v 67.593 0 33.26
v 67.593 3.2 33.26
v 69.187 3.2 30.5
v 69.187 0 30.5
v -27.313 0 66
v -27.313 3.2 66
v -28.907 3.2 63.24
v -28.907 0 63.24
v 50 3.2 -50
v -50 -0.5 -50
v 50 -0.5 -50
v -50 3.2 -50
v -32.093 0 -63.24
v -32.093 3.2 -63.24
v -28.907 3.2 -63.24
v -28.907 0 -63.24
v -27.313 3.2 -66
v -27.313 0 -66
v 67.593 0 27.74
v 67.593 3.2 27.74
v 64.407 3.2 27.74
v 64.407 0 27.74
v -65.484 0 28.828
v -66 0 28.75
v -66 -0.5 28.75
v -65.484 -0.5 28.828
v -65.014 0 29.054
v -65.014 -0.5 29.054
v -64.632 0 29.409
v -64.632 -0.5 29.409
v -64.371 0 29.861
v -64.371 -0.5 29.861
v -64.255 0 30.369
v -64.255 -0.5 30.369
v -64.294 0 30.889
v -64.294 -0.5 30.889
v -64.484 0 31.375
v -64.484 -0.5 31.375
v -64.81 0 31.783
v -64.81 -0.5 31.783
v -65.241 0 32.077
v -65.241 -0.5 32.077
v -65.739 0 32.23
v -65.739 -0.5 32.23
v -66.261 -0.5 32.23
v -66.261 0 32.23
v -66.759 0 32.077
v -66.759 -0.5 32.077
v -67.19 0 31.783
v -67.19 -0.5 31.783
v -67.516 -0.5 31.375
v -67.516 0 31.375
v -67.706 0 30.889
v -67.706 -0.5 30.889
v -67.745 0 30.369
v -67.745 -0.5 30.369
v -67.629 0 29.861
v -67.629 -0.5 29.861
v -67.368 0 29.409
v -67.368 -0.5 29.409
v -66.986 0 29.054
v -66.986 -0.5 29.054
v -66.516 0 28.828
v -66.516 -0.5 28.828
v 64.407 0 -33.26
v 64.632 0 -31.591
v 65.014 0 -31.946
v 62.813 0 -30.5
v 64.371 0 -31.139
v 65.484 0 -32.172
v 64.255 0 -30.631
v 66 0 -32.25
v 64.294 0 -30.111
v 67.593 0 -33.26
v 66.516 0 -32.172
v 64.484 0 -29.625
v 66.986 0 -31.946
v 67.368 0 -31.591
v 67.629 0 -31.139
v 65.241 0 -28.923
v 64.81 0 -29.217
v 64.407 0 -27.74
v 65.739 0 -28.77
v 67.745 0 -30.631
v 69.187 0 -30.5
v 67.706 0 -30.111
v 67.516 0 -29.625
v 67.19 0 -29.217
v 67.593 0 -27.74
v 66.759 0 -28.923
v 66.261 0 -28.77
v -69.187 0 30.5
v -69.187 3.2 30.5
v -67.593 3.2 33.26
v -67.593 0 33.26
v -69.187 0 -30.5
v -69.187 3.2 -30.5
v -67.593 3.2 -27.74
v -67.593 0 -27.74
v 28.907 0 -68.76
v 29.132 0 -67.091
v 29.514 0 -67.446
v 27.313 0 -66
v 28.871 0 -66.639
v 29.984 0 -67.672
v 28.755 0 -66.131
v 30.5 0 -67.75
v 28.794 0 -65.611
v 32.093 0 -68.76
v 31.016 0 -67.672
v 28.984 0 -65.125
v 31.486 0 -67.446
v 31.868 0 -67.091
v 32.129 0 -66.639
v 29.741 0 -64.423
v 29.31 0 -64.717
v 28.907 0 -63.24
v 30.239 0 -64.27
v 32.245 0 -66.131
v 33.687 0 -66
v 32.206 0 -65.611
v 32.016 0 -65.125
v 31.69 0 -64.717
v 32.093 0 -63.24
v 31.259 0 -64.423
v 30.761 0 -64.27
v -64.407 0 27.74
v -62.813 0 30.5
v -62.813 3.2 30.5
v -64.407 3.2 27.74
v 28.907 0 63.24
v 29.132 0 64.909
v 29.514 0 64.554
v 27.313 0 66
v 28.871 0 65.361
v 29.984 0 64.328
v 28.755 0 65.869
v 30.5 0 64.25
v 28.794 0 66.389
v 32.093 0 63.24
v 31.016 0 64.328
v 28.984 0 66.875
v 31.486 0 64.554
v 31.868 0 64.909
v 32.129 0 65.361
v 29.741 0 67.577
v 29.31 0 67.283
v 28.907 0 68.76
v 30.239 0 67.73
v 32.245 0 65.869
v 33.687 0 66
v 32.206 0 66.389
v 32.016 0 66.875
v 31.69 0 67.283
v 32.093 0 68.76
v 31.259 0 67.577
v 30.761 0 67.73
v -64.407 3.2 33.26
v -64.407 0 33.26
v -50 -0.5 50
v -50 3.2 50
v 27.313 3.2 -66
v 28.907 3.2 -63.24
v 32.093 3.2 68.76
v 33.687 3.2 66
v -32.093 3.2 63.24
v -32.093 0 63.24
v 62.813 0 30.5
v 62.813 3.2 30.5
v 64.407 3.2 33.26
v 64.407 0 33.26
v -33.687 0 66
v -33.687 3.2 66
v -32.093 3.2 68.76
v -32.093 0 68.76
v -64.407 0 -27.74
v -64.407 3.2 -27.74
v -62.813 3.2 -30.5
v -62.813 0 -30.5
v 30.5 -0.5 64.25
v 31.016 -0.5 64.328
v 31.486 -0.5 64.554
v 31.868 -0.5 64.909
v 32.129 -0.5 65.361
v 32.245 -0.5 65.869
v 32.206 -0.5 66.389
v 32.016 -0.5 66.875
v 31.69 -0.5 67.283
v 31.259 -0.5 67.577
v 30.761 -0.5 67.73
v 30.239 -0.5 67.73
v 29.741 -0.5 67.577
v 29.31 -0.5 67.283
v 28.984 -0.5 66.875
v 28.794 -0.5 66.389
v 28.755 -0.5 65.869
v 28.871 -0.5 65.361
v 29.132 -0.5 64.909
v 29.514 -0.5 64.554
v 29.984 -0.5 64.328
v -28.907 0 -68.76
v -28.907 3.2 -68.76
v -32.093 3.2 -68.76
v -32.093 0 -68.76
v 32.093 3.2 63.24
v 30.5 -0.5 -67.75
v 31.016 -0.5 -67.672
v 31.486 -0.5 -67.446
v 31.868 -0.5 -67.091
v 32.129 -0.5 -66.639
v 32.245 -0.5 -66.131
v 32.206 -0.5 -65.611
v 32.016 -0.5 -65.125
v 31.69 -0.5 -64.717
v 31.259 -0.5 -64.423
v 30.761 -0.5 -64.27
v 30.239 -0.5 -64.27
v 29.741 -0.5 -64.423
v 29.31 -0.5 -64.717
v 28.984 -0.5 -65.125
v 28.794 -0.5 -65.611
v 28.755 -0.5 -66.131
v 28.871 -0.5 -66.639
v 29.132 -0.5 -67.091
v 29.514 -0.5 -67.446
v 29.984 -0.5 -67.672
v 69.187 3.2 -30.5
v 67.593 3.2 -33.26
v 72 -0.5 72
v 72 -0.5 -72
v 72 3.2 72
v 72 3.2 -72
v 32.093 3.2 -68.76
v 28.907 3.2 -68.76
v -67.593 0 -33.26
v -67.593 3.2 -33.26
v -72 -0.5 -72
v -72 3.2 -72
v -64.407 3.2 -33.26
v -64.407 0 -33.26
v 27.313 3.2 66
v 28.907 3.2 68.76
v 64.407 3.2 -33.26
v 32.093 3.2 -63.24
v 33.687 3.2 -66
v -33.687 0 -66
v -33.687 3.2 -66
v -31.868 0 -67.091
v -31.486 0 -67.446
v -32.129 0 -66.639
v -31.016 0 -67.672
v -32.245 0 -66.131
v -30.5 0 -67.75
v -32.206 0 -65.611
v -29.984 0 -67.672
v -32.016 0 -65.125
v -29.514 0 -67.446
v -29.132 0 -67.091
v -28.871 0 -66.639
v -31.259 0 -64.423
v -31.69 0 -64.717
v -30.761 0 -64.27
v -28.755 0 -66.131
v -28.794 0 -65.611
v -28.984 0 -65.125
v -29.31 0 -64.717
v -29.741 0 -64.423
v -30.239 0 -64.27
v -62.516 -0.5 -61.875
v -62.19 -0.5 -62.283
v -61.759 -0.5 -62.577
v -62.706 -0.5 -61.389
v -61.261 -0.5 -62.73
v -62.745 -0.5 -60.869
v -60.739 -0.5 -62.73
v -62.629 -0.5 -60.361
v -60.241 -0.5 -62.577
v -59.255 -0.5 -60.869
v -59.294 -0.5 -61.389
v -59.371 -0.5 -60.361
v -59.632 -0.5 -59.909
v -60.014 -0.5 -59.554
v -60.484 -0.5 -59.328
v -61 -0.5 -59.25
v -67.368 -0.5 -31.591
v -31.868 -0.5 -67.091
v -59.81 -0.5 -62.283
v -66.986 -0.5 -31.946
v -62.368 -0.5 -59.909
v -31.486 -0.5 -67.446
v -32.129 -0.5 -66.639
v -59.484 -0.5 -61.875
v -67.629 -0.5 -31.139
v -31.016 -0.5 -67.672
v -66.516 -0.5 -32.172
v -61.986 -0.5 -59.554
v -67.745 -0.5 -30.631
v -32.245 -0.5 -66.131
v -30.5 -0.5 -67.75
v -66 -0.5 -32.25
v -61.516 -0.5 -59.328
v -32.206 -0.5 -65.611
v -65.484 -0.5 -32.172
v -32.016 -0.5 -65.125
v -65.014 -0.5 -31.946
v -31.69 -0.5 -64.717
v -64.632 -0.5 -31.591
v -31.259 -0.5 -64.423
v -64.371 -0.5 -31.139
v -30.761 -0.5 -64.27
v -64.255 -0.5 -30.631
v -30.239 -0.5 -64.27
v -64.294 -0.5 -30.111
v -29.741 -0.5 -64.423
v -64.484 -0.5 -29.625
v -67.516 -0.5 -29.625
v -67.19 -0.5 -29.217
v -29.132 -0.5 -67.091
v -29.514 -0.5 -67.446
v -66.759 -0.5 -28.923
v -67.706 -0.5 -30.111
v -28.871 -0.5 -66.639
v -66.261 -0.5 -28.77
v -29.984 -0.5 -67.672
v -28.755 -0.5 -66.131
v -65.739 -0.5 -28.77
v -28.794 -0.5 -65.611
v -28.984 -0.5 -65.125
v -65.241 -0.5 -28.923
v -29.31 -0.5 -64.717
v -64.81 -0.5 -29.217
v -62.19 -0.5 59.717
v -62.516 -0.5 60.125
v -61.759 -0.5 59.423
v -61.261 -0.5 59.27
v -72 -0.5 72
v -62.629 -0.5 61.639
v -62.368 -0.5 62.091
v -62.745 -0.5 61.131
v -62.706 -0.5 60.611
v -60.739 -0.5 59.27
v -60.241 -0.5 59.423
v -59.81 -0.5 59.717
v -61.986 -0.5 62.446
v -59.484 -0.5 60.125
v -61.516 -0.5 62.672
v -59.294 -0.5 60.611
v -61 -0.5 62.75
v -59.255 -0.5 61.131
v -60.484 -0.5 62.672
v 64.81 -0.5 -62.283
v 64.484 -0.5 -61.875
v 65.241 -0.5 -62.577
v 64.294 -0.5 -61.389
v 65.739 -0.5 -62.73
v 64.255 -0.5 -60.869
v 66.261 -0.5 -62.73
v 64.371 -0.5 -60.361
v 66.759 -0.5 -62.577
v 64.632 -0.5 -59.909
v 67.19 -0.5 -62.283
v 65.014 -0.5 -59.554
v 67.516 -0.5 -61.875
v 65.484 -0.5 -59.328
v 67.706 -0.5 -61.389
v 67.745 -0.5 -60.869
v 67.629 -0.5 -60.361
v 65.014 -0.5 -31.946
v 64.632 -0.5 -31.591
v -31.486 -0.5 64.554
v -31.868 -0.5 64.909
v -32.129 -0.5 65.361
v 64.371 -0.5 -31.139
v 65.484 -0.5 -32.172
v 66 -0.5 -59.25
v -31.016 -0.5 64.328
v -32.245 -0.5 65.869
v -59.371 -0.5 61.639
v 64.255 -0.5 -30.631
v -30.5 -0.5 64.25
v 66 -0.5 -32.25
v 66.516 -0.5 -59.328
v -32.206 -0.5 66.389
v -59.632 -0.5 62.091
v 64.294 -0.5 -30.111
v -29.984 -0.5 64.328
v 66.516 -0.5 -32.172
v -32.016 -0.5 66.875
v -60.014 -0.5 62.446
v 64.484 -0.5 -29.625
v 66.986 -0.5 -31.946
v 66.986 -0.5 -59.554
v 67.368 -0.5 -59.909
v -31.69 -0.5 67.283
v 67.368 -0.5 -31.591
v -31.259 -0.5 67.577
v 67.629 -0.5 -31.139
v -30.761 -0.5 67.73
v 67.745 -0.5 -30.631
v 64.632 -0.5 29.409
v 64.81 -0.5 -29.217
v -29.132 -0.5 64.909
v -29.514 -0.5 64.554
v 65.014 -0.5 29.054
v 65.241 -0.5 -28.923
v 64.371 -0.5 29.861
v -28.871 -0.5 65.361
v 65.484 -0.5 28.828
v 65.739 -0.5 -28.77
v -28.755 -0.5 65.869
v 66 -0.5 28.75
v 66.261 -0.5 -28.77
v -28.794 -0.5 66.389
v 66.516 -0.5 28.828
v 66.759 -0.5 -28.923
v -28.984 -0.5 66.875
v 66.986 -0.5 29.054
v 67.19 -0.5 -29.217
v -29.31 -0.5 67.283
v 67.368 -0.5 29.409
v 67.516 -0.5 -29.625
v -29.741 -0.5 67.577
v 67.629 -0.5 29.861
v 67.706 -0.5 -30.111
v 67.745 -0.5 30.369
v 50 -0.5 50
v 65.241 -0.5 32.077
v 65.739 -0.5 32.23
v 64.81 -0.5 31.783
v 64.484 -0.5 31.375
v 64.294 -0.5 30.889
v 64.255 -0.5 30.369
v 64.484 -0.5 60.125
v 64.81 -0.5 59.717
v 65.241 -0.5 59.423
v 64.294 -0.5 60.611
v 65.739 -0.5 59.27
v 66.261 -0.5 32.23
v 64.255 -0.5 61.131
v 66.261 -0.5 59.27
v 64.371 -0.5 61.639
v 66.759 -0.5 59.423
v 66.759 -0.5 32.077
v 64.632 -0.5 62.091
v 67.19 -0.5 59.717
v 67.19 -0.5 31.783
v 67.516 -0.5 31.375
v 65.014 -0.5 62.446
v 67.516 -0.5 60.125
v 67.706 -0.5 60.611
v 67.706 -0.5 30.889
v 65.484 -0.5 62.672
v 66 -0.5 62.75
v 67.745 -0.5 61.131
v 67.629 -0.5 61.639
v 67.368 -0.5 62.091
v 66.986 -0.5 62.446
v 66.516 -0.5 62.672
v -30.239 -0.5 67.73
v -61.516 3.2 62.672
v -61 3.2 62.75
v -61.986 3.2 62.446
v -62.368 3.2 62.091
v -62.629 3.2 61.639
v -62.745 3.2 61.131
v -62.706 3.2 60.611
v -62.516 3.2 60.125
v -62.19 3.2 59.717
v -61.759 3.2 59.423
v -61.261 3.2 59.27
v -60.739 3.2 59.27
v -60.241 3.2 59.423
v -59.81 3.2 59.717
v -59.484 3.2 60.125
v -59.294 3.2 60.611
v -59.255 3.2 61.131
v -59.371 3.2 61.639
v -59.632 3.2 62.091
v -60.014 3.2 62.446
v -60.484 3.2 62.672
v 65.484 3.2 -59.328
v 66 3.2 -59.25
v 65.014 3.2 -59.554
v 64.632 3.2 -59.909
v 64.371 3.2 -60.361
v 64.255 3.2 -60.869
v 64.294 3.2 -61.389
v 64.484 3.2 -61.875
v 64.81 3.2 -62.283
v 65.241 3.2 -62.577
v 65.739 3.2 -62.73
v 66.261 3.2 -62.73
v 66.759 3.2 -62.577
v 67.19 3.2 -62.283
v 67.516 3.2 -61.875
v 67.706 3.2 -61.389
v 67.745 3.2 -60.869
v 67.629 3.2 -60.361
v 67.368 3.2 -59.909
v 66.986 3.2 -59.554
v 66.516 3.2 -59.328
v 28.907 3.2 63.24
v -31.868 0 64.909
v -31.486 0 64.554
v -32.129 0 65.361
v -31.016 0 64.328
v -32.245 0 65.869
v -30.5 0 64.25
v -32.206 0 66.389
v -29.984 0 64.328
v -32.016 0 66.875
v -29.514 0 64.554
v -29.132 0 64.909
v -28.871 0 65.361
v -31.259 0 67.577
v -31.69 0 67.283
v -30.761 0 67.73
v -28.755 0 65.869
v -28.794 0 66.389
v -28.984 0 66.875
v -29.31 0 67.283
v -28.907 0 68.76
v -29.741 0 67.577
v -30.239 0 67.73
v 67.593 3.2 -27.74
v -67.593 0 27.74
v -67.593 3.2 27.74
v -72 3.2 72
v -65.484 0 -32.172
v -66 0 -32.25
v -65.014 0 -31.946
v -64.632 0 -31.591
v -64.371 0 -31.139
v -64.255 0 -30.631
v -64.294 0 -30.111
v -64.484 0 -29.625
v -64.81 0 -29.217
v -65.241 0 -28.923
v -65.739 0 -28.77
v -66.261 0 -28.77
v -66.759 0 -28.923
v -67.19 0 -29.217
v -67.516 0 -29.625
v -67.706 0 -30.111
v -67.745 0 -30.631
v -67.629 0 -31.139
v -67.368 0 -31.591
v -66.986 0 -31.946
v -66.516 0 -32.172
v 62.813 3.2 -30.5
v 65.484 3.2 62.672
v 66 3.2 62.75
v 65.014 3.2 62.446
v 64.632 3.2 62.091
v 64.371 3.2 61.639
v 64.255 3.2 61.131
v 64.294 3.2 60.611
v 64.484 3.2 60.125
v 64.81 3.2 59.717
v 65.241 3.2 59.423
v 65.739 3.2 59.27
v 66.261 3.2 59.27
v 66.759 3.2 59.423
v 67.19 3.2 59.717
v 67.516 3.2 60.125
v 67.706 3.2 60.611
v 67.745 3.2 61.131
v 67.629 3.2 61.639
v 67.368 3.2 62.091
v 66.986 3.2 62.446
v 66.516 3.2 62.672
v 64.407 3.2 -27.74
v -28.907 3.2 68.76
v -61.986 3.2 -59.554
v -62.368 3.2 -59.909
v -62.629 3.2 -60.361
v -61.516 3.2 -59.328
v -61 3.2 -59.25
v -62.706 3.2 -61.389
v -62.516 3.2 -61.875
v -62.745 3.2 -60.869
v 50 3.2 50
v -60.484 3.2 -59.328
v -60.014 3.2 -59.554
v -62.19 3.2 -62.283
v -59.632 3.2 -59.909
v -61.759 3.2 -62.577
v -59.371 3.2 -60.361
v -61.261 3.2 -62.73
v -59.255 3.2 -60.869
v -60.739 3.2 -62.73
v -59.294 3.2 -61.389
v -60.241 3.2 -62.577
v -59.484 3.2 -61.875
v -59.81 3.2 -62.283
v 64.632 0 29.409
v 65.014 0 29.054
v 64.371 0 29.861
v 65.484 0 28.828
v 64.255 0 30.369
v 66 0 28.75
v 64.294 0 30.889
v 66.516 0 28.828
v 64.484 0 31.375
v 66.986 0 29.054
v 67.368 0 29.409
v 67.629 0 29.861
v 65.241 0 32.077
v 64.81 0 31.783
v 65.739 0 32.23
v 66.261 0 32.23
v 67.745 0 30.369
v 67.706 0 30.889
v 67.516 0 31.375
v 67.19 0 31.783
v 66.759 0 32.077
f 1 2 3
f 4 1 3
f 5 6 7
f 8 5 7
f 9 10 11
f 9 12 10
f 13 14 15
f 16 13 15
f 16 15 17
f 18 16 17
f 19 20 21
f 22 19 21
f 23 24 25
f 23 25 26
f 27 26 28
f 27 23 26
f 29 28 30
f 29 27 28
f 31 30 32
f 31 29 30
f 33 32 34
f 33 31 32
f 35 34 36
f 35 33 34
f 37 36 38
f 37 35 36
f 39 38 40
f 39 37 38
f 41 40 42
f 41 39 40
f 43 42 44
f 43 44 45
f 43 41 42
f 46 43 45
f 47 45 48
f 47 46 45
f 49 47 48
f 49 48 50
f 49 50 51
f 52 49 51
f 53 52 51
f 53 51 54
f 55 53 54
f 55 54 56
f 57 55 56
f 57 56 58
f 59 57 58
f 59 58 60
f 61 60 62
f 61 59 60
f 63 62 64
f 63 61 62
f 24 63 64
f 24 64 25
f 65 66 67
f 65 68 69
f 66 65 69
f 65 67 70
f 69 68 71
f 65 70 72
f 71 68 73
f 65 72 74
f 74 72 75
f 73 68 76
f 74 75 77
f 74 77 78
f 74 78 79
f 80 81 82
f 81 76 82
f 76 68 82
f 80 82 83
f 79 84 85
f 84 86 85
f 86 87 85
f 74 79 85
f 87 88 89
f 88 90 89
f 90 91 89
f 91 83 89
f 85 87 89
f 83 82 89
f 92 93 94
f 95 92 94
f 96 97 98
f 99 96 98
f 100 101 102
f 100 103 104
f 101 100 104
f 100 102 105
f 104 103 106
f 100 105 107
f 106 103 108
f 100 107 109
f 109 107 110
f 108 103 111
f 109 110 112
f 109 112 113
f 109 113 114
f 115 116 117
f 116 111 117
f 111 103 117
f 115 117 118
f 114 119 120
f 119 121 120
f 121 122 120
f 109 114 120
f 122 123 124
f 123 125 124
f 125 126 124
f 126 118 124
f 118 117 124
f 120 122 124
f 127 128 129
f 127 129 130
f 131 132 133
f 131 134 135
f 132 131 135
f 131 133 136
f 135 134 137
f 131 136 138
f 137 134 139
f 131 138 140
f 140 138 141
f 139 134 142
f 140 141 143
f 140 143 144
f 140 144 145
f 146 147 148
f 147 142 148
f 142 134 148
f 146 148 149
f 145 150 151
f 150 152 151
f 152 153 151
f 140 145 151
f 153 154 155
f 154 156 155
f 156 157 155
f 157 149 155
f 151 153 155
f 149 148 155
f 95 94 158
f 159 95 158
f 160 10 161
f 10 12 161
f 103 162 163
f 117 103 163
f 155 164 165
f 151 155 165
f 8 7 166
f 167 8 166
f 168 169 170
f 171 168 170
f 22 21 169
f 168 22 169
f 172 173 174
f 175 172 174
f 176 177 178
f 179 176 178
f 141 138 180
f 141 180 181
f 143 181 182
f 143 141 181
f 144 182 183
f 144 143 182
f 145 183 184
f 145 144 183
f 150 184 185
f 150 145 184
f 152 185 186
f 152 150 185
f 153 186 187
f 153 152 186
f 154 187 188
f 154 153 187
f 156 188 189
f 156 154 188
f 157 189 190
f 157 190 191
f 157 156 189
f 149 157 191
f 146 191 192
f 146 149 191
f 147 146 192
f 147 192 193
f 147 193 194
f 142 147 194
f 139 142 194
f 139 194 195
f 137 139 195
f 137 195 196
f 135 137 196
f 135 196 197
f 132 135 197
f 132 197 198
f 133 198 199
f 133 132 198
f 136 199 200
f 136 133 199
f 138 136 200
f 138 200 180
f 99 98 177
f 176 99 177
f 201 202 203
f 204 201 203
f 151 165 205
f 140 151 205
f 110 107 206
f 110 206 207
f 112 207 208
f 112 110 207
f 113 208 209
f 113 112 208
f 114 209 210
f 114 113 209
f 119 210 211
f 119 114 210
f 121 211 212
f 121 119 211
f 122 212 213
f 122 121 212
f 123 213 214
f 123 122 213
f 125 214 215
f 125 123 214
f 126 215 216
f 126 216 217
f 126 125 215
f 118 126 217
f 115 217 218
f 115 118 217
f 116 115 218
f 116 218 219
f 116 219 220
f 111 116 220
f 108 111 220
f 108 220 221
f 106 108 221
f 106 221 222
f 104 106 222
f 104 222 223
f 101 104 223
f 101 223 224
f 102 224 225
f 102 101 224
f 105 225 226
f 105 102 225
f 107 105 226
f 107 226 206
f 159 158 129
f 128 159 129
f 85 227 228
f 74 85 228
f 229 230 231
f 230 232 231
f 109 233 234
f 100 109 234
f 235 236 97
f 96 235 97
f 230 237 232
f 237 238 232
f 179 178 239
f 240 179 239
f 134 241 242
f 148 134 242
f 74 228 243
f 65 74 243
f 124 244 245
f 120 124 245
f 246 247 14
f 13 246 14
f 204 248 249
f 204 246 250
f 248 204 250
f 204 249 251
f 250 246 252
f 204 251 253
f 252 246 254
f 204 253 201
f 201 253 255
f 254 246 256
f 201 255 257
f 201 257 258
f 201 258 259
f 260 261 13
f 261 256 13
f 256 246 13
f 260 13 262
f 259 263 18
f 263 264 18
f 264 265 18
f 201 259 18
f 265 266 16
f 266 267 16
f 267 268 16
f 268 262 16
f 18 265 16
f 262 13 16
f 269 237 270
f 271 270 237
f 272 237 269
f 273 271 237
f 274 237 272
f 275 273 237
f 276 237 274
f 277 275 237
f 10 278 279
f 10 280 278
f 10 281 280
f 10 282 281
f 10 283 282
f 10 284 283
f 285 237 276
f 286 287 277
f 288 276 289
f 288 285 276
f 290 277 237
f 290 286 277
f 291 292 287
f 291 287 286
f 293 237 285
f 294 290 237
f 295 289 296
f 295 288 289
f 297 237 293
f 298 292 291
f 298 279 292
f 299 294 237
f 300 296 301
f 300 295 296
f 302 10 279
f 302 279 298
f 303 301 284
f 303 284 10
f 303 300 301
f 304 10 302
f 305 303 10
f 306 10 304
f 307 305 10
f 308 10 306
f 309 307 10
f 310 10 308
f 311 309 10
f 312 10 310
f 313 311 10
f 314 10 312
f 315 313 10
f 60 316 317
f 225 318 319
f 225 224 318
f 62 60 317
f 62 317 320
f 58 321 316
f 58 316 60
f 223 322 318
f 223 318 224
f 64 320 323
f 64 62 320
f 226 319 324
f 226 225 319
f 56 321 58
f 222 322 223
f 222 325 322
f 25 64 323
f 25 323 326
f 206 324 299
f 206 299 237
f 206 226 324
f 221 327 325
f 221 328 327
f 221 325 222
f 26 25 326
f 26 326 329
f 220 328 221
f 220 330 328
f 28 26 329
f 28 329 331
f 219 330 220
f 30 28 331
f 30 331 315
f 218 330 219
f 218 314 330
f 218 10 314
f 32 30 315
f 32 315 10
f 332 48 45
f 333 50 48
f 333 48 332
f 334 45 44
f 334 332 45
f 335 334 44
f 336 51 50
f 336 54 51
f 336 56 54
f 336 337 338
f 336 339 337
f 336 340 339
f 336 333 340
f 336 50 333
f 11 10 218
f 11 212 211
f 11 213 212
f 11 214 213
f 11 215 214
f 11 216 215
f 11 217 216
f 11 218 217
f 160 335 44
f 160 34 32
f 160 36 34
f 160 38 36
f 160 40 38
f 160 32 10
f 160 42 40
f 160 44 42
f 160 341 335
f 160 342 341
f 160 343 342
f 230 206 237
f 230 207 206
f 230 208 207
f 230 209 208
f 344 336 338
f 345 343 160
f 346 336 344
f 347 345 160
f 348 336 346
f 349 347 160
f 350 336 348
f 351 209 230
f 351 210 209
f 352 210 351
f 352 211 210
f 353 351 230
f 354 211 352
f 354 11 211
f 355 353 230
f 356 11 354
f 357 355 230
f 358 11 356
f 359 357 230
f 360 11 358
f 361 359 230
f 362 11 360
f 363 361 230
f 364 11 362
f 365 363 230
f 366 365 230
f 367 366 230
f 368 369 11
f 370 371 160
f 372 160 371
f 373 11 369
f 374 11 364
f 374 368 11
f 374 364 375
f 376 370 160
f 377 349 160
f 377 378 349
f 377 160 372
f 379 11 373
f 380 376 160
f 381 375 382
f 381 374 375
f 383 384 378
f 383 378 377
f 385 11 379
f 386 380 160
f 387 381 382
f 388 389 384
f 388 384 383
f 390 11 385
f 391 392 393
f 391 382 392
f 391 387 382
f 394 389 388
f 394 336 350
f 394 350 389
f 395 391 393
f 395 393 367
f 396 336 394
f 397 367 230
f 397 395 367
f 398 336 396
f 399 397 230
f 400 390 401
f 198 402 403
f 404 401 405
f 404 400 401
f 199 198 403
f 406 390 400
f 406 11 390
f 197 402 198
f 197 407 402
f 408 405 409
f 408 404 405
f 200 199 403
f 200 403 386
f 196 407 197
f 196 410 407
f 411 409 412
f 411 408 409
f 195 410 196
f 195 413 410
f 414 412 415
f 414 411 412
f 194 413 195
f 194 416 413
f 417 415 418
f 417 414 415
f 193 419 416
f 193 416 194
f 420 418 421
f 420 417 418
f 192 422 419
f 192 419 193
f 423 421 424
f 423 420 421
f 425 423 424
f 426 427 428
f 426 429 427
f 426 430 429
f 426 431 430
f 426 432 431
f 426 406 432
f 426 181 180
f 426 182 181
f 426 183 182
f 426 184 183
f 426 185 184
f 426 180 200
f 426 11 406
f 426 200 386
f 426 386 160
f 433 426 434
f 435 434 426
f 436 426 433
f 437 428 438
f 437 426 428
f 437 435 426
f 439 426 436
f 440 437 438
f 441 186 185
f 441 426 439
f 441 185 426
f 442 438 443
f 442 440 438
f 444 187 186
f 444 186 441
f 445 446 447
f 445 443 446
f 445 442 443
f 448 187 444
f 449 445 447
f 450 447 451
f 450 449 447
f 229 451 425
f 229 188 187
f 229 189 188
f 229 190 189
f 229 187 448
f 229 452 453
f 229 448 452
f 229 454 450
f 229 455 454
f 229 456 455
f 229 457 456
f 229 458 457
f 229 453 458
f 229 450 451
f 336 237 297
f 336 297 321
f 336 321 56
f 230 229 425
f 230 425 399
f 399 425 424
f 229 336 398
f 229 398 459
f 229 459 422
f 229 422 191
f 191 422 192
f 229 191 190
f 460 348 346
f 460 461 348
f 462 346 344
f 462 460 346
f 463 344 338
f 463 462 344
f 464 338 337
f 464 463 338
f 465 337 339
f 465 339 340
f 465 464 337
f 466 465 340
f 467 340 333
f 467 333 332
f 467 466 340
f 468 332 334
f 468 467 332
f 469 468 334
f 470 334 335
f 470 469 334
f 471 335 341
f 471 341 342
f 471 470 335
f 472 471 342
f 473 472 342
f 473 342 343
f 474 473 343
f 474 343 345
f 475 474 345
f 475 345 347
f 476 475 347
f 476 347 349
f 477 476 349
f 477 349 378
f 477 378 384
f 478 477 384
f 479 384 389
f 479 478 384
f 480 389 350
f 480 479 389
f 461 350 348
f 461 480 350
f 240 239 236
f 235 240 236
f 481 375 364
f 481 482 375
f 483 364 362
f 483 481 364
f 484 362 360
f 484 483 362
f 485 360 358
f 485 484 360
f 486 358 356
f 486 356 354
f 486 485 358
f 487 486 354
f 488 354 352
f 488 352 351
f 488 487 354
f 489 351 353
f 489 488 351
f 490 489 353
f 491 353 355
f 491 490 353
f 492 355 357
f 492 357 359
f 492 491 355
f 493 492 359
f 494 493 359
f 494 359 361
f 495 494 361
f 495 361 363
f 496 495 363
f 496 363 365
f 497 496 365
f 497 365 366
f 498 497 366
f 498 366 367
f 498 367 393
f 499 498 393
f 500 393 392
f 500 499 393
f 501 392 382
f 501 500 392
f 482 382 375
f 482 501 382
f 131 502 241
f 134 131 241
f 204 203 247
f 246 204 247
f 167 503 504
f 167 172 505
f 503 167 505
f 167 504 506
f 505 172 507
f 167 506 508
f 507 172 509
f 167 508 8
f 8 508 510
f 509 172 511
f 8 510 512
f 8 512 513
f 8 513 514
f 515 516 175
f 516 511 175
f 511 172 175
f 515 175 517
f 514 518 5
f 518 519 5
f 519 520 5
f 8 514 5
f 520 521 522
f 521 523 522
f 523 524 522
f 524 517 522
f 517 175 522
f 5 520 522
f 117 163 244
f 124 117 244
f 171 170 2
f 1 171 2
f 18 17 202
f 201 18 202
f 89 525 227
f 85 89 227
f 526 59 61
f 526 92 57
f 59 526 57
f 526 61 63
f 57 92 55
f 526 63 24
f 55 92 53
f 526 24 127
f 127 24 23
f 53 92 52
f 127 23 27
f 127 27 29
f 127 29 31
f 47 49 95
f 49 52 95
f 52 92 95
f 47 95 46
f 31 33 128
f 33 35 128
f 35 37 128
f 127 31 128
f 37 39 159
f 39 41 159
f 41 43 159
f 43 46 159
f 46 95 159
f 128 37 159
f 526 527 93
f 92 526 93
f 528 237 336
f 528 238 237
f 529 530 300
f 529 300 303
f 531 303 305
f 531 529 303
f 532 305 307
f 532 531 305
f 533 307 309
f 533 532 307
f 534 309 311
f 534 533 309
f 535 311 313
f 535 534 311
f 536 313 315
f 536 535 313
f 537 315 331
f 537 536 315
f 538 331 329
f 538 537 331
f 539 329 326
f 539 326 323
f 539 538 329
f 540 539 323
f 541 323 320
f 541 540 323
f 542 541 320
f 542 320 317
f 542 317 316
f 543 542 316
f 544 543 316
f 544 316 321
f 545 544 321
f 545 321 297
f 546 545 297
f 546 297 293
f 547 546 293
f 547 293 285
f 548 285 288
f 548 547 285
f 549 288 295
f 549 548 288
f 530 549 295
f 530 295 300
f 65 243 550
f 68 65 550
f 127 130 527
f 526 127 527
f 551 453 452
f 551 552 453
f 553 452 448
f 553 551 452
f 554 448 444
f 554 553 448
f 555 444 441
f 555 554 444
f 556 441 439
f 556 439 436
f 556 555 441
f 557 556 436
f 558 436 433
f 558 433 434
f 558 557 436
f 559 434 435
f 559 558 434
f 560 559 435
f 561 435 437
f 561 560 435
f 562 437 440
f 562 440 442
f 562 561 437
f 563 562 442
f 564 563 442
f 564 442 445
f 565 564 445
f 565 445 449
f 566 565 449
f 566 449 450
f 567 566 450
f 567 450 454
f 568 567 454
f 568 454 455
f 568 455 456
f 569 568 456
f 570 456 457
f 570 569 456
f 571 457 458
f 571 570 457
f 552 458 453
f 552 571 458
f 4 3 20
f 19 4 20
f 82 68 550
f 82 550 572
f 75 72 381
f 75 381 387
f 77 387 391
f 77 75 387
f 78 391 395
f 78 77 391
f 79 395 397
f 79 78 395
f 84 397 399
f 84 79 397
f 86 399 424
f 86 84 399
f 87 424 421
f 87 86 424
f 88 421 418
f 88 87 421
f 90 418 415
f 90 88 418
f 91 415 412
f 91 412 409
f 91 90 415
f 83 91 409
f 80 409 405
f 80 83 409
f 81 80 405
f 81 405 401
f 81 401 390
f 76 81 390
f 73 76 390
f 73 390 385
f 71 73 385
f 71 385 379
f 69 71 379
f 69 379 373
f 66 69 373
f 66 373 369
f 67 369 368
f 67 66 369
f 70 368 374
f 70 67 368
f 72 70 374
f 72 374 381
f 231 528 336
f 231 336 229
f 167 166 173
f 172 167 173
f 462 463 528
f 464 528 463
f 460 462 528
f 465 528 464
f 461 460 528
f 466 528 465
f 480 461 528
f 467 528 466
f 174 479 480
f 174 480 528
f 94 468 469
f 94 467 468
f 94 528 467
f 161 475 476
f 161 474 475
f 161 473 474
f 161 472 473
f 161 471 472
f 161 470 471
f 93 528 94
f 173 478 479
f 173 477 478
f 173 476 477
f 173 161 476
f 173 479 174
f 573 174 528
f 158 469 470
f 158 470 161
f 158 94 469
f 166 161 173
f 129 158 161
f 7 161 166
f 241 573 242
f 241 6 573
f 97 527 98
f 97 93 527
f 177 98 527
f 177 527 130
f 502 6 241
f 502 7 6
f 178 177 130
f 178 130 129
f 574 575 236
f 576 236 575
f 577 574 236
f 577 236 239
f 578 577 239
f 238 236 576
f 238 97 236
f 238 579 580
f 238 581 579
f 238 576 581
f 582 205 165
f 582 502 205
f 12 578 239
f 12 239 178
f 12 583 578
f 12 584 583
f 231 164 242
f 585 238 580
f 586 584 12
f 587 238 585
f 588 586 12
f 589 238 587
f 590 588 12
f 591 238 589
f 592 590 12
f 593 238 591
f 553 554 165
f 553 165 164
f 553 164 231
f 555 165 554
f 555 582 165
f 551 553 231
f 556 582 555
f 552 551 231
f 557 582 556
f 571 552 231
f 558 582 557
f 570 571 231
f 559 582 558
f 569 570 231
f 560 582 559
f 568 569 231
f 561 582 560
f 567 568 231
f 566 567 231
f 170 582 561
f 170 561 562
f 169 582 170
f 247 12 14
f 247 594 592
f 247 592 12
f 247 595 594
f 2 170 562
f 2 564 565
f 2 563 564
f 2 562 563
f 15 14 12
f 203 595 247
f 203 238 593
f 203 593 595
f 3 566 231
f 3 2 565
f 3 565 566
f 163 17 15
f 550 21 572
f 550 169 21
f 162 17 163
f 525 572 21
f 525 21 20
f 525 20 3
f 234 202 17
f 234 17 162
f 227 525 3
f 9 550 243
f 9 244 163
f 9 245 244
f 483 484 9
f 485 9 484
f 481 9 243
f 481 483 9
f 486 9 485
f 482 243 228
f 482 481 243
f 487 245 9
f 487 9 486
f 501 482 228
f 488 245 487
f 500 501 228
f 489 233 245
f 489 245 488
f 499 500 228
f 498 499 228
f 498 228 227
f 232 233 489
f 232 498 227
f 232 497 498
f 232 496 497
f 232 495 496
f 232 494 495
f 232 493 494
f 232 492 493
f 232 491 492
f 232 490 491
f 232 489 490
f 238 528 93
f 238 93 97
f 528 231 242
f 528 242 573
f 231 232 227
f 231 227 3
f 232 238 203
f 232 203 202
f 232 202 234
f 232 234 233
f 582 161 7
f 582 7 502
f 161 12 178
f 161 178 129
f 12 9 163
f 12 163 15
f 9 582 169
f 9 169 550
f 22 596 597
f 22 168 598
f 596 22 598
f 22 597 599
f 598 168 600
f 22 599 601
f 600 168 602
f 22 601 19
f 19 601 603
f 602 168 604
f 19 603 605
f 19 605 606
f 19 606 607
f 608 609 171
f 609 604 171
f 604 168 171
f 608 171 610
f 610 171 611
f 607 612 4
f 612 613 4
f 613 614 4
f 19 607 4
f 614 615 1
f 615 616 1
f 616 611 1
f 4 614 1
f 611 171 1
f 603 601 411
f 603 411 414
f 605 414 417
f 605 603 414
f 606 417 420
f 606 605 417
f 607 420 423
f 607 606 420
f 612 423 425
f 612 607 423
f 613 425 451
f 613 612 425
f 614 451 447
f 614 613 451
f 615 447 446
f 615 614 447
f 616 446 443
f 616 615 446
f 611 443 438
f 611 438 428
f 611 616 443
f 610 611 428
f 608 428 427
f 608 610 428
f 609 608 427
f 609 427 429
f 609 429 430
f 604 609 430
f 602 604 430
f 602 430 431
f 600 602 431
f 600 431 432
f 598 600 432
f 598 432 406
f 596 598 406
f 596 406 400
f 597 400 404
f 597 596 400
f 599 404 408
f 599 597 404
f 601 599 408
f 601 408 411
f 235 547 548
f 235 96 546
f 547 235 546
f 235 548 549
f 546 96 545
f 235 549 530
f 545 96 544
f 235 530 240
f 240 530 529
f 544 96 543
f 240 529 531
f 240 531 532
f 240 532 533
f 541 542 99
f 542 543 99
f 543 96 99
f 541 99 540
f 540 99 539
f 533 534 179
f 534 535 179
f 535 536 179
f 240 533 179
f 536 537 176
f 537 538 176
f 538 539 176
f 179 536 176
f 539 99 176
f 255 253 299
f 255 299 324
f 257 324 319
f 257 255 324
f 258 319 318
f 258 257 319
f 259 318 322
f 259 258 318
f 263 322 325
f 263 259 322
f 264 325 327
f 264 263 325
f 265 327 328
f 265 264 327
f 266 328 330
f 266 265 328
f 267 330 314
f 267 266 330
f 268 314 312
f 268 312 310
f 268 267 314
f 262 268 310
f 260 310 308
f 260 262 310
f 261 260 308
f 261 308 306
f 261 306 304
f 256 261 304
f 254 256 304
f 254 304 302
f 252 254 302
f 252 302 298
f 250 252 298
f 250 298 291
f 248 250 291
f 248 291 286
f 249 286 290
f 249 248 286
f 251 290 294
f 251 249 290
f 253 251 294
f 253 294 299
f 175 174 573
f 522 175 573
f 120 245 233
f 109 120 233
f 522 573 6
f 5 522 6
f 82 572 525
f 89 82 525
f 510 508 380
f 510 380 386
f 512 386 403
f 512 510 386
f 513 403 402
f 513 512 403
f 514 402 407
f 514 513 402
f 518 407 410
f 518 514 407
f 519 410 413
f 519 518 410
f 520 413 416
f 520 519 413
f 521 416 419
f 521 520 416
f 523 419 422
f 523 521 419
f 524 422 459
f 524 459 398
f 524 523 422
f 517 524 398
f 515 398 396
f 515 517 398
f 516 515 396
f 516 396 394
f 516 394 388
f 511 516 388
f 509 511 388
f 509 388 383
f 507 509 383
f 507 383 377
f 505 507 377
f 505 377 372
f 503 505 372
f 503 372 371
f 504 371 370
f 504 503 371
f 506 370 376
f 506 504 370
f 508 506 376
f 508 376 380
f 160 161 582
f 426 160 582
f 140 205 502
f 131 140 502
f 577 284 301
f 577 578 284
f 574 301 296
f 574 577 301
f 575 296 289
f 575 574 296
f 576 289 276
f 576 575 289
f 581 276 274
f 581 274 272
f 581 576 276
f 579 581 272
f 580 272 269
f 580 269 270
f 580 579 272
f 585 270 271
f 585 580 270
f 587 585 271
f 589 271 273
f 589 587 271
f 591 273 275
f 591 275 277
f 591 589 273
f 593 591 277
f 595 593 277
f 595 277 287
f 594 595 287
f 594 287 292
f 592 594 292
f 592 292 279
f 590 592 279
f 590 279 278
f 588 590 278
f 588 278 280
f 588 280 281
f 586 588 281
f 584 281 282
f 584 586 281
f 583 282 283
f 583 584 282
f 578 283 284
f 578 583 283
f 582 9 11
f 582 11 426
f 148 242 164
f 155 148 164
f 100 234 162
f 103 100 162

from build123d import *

# Parameters (mm, degrees)
CROQUIS1_W              = 140
CROQUIS1_H              = 140
CROQUIS1_R              = 1.5
SALIENTE_EXTRUIR1_DEPTH = 0.5
CROQUIS2_R              = 1.75
CROQUIS2_W              = 100
CROQUIS2_H              = 100
CORTAR_EXTRUIR1_DEPTH   = 10
SALIENTE_EXTRUIR3_START = 2.7
CROQUIS3_W              = 144
CROQUIS3_H              = 144
CROQUIS3_R              = 1.75
CROQUIS3_W_2            = 100
CROQUIS3_H_2            = 100
SALIENTE_EXTRUIR3_DEPTH = 2.7
CROQUIS4_W              = 144
CROQUIS4_H              = 144
CROQUIS4_W_2            = 140
CROQUIS4_H_2            = 140
SALIENTE_EXTRUIR4_DEPTH = 0.5
CROQUIS5_W              = 144
CROQUIS5_H              = 144
CROQUIS5_R              = 1.75
CROQUIS5_W_2            = 100
CROQUIS5_H_2            = 100
SALIENTE_EXTRUIR5_DEPTH = 0.5


with BuildPart() as part:
    # Croquis1 → Saliente-Extruir1 (new body)
    with BuildSketch(Plane(origin=(0, 0, 0), x_dir=(1, 0, 0), z_dir=(0, 1, 0))):
        Rectangle(CROQUIS1_W, CROQUIS1_H)
        with Locations(Location((-61, 61, 0), (0, 0, 270))):
            Circle(CROQUIS1_R, mode=Mode.SUBTRACT)
        with Locations(Location((66, 61, 0), (0, 0, 270))):
            Circle(CROQUIS1_R, mode=Mode.SUBTRACT)
        with Locations(Location((66, -61, 0), (0, 0, 270))):
            Circle(CROQUIS1_R, mode=Mode.SUBTRACT)
        with Locations(Location((-61, -61, 0), (0, 0, 270))):
            Circle(CROQUIS1_R, mode=Mode.SUBTRACT)
        with Locations(Location((66, 30.5, 0), (0, 0, 270))):
            Circle(CROQUIS1_R, mode=Mode.SUBTRACT)
        with Locations(Location((66, -30.5, 0), (0, 0, 270))):
            Circle(CROQUIS1_R, mode=Mode.SUBTRACT)
        with Locations(Location((-30.5, -66, 0), (0, 0, 270))):
            Circle(CROQUIS1_R, mode=Mode.SUBTRACT)
        with Locations(Location((30.5, -66, 0), (0, 0, 270))):
            Circle(CROQUIS1_R, mode=Mode.SUBTRACT)
        with Locations(Location((-30.5, 66, 0), (0, 0, 90))):
            Circle(CROQUIS1_R, mode=Mode.SUBTRACT)
        with Locations(Location((30.5, 66, 0), (0, 0, 90))):
            Circle(CROQUIS1_R, mode=Mode.SUBTRACT)
        with Locations(Location((-66, 30.5, 0), (0, 0, 90))):
            Circle(CROQUIS1_R, mode=Mode.SUBTRACT)
        with Locations(Location((-66, -30.5, 0), (0, 0, 90))):
            Circle(CROQUIS1_R, mode=Mode.SUBTRACT)
    extrude(amount=SALIENTE_EXTRUIR1_DEPTH)

    # Croquis2 → Cortar-Extruir1 (cut)
    with BuildSketch(Plane(origin=(0, 0.5, 0), x_dir=(1, 0, 0), z_dir=(0, 1, 0))):
        with Locations(Location((66, 61, 0), (0, 0, 270))):
            Circle(CROQUIS2_R)
        with Locations(Location((-61, 61, 0), (0, 0, 270))):
            Circle(CROQUIS2_R)
        with Locations(Location((-61, -61, 0), (0, 0, 270))):
            Circle(CROQUIS2_R)
        with Locations(Location((66, -61, 0), (0, 0, 270))):
            Circle(CROQUIS2_R)
        Polygon((-28.906513257, 63.24), (-27.313026514, 66), (-28.906513257, 68.76), (-32.093486743, 68.76), (-33.686973486, 66), (-32.093486743, 63.24), align=None)
        Polygon((32.093486743, 63.24), (33.686973486, 66), (32.093486743, 68.76), (28.906513257, 68.76), (27.313026514, 66), (28.906513257, 63.24), align=None)
        Polygon((67.593486743, 27.74), (69.186973486, 30.5), (67.593486743, 33.26), (64.406513257, 33.26), (62.813026514, 30.5), (64.406513257, 27.74), align=None)
        Polygon((67.593486743, -33.26), (69.186973486, -30.5), (67.593486743, -27.74), (64.406513257, -27.74), (62.813026514, -30.5), (64.406513257, -33.26), align=None)
        Polygon((32.093486743, -68.76), (33.686973486, -66), (32.093486743, -63.24), (28.906513257, -63.24), (27.313026514, -66), (28.906513257, -68.76), align=None)
        Polygon((-28.906513257, -68.76), (-27.313026514, -66), (-28.906513257, -63.24), (-32.093486743, -63.24), (-33.686973486, -66), (-32.093486743, -68.76), align=None)
        Polygon((-64.406513257, -33.26), (-62.813026514, -30.5), (-64.406513257, -27.74), (-67.593486743, -27.74), (-69.186973486, -30.5), (-67.593486743, -33.26), align=None)
        Polygon((-64.406513257, 27.74), (-62.813026514, 30.5), (-64.406513257, 33.26), (-67.593486743, 33.26), (-69.186973486, 30.5), (-67.593486743, 27.74), align=None)
        Rectangle(CROQUIS2_W, CROQUIS2_H)
    extrude(amount=-CORTAR_EXTRUIR1_DEPTH, mode=Mode.SUBTRACT)

    # Croquis3 → Saliente-Extruir3 (add)
    with BuildSketch(Plane(origin=(0, 0.5, 0), x_dir=(1, 0, 0), z_dir=(0, 1, 0)).offset(SALIENTE_EXTRUIR3_START)):
        Rectangle(CROQUIS3_W, CROQUIS3_H)
        with Locations(Location((-61, -61, 0), (0, 0, 270))):
            Circle(CROQUIS3_R, mode=Mode.SUBTRACT)
        with Locations(Location((-61, 61, 0), (0, 0, 270))):
            Circle(CROQUIS3_R, mode=Mode.SUBTRACT)
        with Locations(Location((66, 61, 0), (0, 0, 270))):
            Circle(CROQUIS3_R, mode=Mode.SUBTRACT)
        with Locations(Location((66, -61, 0), (0, 0, 270))):
            Circle(CROQUIS3_R, mode=Mode.SUBTRACT)
        Rectangle(CROQUIS3_W_2, CROQUIS3_H_2, mode=Mode.SUBTRACT)
        Polygon((-33.686973486, -66), (-32.093486743, -68.76), (-28.906513257, -68.76), (-27.313026514, -66), (-28.906513257, -63.24), (-32.093486743, -63.24), align=None, mode=Mode.SUBTRACT)
        Polygon((-67.593486743, -33.26), (-64.406513257, -33.26), (-62.813026514, -30.5), (-64.406513257, -27.74), (-67.593486743, -27.74), (-69.186973486, -30.5), align=None, mode=Mode.SUBTRACT)
        Polygon((28.906513257, 63.24), (32.093486743, 63.24), (33.686973486, 66), (32.093486743, 68.76), (28.906513257, 68.76), (27.313026514, 66), align=None, mode=Mode.SUBTRACT)
        Polygon((-33.686973486, 66), (-32.093486743, 63.24), (-28.906513257, 63.24), (-27.313026514, 66), (-28.906513257, 68.76), (-32.093486743, 68.76), align=None, mode=Mode.SUBTRACT)
        Polygon((62.813026514, 30.5), (64.406513257, 27.74), (67.593486743, 27.74), (69.186973486, 30.5), (67.593486743, 33.26), (64.406513257, 33.26), align=None, mode=Mode.SUBTRACT)
        Polygon((67.593486743, -33.26), (69.186973486, -30.5), (67.593486743, -27.74), (64.406513257, -27.74), (62.813026514, -30.5), (64.406513257, -33.26), align=None, mode=Mode.SUBTRACT)
        Polygon((33.686973486, -66), (32.093486743, -63.24), (28.906513257, -63.24), (27.313026514, -66), (28.906513257, -68.76), (32.093486743, -68.76), align=None, mode=Mode.SUBTRACT)
        Polygon((-64.406513257, 27.74), (-62.813026514, 30.5), (-64.406513257, 33.26), (-67.593486743, 33.26), (-69.186973486, 30.5), (-67.593486743, 27.74), align=None, mode=Mode.SUBTRACT)
    extrude(amount=-SALIENTE_EXTRUIR3_DEPTH)

    # Croquis4 → Saliente-Extruir4 (add)
    with BuildSketch(Plane.XZ.offset(-0.5)):
        Rectangle(CROQUIS4_W, CROQUIS4_H)
        Rectangle(CROQUIS4_W_2, CROQUIS4_H_2, mode=Mode.SUBTRACT)
    extrude(amount=SALIENTE_EXTRUIR4_DEPTH)

    # Croquis5 → Saliente-Extruir5 (add)
    with BuildSketch(Plane.XZ):
        Rectangle(CROQUIS5_W, CROQUIS5_H)
        with Locations(Location((66, -61, 0), (0, 0, 90))):
            Circle(CROQUIS5_R, mode=Mode.SUBTRACT)
        with Locations(Location((-61, -61, 0), (0, 0, 90))):
            Circle(CROQUIS5_R, mode=Mode.SUBTRACT)
        with Locations(Location((66, 61, 0), (0, 0, 90))):
            Circle(CROQUIS5_R, mode=Mode.SUBTRACT)
        with Locations(Location((-61, 61, 0), (0, 0, 90))):
            Circle(CROQUIS5_R, mode=Mode.SUBTRACT)
        with Locations(Location((66, 30.5, 0), (0, 0, 270))):
            Circle(CROQUIS5_R, mode=Mode.SUBTRACT)
        with Locations(Location((30.5, 66, 0), (0, 0, 270))):
            Circle(CROQUIS5_R, mode=Mode.SUBTRACT)
        with Locations(Location((-30.5, 66, 0), (0, 0, 270))):
            Circle(CROQUIS5_R, mode=Mode.SUBTRACT)
        with Locations(Location((-66, 30.5, 0), (0, 0, 270))):
            Circle(CROQUIS5_R, mode=Mode.SUBTRACT)
        with Locations(Location((-66, -30.5, 0), (0, 0, 270))):
            Circle(CROQUIS5_R, mode=Mode.SUBTRACT)
        with Locations(Location((-30.5, -66, 0), (0, 0, 270))):
            Circle(CROQUIS5_R, mode=Mode.SUBTRACT)
        with Locations(Location((30.5, -66, 0), (0, 0, 270))):
            Circle(CROQUIS5_R, mode=Mode.SUBTRACT)
        with Locations(Location((66, -30.5, 0), (0, 0, 270))):
            Circle(CROQUIS5_R, mode=Mode.SUBTRACT)
        Rectangle(CROQUIS5_W_2, CROQUIS5_H_2, mode=Mode.SUBTRACT)
    extrude(amount=SALIENTE_EXTRUIR5_DEPTH)


solid = part.part
